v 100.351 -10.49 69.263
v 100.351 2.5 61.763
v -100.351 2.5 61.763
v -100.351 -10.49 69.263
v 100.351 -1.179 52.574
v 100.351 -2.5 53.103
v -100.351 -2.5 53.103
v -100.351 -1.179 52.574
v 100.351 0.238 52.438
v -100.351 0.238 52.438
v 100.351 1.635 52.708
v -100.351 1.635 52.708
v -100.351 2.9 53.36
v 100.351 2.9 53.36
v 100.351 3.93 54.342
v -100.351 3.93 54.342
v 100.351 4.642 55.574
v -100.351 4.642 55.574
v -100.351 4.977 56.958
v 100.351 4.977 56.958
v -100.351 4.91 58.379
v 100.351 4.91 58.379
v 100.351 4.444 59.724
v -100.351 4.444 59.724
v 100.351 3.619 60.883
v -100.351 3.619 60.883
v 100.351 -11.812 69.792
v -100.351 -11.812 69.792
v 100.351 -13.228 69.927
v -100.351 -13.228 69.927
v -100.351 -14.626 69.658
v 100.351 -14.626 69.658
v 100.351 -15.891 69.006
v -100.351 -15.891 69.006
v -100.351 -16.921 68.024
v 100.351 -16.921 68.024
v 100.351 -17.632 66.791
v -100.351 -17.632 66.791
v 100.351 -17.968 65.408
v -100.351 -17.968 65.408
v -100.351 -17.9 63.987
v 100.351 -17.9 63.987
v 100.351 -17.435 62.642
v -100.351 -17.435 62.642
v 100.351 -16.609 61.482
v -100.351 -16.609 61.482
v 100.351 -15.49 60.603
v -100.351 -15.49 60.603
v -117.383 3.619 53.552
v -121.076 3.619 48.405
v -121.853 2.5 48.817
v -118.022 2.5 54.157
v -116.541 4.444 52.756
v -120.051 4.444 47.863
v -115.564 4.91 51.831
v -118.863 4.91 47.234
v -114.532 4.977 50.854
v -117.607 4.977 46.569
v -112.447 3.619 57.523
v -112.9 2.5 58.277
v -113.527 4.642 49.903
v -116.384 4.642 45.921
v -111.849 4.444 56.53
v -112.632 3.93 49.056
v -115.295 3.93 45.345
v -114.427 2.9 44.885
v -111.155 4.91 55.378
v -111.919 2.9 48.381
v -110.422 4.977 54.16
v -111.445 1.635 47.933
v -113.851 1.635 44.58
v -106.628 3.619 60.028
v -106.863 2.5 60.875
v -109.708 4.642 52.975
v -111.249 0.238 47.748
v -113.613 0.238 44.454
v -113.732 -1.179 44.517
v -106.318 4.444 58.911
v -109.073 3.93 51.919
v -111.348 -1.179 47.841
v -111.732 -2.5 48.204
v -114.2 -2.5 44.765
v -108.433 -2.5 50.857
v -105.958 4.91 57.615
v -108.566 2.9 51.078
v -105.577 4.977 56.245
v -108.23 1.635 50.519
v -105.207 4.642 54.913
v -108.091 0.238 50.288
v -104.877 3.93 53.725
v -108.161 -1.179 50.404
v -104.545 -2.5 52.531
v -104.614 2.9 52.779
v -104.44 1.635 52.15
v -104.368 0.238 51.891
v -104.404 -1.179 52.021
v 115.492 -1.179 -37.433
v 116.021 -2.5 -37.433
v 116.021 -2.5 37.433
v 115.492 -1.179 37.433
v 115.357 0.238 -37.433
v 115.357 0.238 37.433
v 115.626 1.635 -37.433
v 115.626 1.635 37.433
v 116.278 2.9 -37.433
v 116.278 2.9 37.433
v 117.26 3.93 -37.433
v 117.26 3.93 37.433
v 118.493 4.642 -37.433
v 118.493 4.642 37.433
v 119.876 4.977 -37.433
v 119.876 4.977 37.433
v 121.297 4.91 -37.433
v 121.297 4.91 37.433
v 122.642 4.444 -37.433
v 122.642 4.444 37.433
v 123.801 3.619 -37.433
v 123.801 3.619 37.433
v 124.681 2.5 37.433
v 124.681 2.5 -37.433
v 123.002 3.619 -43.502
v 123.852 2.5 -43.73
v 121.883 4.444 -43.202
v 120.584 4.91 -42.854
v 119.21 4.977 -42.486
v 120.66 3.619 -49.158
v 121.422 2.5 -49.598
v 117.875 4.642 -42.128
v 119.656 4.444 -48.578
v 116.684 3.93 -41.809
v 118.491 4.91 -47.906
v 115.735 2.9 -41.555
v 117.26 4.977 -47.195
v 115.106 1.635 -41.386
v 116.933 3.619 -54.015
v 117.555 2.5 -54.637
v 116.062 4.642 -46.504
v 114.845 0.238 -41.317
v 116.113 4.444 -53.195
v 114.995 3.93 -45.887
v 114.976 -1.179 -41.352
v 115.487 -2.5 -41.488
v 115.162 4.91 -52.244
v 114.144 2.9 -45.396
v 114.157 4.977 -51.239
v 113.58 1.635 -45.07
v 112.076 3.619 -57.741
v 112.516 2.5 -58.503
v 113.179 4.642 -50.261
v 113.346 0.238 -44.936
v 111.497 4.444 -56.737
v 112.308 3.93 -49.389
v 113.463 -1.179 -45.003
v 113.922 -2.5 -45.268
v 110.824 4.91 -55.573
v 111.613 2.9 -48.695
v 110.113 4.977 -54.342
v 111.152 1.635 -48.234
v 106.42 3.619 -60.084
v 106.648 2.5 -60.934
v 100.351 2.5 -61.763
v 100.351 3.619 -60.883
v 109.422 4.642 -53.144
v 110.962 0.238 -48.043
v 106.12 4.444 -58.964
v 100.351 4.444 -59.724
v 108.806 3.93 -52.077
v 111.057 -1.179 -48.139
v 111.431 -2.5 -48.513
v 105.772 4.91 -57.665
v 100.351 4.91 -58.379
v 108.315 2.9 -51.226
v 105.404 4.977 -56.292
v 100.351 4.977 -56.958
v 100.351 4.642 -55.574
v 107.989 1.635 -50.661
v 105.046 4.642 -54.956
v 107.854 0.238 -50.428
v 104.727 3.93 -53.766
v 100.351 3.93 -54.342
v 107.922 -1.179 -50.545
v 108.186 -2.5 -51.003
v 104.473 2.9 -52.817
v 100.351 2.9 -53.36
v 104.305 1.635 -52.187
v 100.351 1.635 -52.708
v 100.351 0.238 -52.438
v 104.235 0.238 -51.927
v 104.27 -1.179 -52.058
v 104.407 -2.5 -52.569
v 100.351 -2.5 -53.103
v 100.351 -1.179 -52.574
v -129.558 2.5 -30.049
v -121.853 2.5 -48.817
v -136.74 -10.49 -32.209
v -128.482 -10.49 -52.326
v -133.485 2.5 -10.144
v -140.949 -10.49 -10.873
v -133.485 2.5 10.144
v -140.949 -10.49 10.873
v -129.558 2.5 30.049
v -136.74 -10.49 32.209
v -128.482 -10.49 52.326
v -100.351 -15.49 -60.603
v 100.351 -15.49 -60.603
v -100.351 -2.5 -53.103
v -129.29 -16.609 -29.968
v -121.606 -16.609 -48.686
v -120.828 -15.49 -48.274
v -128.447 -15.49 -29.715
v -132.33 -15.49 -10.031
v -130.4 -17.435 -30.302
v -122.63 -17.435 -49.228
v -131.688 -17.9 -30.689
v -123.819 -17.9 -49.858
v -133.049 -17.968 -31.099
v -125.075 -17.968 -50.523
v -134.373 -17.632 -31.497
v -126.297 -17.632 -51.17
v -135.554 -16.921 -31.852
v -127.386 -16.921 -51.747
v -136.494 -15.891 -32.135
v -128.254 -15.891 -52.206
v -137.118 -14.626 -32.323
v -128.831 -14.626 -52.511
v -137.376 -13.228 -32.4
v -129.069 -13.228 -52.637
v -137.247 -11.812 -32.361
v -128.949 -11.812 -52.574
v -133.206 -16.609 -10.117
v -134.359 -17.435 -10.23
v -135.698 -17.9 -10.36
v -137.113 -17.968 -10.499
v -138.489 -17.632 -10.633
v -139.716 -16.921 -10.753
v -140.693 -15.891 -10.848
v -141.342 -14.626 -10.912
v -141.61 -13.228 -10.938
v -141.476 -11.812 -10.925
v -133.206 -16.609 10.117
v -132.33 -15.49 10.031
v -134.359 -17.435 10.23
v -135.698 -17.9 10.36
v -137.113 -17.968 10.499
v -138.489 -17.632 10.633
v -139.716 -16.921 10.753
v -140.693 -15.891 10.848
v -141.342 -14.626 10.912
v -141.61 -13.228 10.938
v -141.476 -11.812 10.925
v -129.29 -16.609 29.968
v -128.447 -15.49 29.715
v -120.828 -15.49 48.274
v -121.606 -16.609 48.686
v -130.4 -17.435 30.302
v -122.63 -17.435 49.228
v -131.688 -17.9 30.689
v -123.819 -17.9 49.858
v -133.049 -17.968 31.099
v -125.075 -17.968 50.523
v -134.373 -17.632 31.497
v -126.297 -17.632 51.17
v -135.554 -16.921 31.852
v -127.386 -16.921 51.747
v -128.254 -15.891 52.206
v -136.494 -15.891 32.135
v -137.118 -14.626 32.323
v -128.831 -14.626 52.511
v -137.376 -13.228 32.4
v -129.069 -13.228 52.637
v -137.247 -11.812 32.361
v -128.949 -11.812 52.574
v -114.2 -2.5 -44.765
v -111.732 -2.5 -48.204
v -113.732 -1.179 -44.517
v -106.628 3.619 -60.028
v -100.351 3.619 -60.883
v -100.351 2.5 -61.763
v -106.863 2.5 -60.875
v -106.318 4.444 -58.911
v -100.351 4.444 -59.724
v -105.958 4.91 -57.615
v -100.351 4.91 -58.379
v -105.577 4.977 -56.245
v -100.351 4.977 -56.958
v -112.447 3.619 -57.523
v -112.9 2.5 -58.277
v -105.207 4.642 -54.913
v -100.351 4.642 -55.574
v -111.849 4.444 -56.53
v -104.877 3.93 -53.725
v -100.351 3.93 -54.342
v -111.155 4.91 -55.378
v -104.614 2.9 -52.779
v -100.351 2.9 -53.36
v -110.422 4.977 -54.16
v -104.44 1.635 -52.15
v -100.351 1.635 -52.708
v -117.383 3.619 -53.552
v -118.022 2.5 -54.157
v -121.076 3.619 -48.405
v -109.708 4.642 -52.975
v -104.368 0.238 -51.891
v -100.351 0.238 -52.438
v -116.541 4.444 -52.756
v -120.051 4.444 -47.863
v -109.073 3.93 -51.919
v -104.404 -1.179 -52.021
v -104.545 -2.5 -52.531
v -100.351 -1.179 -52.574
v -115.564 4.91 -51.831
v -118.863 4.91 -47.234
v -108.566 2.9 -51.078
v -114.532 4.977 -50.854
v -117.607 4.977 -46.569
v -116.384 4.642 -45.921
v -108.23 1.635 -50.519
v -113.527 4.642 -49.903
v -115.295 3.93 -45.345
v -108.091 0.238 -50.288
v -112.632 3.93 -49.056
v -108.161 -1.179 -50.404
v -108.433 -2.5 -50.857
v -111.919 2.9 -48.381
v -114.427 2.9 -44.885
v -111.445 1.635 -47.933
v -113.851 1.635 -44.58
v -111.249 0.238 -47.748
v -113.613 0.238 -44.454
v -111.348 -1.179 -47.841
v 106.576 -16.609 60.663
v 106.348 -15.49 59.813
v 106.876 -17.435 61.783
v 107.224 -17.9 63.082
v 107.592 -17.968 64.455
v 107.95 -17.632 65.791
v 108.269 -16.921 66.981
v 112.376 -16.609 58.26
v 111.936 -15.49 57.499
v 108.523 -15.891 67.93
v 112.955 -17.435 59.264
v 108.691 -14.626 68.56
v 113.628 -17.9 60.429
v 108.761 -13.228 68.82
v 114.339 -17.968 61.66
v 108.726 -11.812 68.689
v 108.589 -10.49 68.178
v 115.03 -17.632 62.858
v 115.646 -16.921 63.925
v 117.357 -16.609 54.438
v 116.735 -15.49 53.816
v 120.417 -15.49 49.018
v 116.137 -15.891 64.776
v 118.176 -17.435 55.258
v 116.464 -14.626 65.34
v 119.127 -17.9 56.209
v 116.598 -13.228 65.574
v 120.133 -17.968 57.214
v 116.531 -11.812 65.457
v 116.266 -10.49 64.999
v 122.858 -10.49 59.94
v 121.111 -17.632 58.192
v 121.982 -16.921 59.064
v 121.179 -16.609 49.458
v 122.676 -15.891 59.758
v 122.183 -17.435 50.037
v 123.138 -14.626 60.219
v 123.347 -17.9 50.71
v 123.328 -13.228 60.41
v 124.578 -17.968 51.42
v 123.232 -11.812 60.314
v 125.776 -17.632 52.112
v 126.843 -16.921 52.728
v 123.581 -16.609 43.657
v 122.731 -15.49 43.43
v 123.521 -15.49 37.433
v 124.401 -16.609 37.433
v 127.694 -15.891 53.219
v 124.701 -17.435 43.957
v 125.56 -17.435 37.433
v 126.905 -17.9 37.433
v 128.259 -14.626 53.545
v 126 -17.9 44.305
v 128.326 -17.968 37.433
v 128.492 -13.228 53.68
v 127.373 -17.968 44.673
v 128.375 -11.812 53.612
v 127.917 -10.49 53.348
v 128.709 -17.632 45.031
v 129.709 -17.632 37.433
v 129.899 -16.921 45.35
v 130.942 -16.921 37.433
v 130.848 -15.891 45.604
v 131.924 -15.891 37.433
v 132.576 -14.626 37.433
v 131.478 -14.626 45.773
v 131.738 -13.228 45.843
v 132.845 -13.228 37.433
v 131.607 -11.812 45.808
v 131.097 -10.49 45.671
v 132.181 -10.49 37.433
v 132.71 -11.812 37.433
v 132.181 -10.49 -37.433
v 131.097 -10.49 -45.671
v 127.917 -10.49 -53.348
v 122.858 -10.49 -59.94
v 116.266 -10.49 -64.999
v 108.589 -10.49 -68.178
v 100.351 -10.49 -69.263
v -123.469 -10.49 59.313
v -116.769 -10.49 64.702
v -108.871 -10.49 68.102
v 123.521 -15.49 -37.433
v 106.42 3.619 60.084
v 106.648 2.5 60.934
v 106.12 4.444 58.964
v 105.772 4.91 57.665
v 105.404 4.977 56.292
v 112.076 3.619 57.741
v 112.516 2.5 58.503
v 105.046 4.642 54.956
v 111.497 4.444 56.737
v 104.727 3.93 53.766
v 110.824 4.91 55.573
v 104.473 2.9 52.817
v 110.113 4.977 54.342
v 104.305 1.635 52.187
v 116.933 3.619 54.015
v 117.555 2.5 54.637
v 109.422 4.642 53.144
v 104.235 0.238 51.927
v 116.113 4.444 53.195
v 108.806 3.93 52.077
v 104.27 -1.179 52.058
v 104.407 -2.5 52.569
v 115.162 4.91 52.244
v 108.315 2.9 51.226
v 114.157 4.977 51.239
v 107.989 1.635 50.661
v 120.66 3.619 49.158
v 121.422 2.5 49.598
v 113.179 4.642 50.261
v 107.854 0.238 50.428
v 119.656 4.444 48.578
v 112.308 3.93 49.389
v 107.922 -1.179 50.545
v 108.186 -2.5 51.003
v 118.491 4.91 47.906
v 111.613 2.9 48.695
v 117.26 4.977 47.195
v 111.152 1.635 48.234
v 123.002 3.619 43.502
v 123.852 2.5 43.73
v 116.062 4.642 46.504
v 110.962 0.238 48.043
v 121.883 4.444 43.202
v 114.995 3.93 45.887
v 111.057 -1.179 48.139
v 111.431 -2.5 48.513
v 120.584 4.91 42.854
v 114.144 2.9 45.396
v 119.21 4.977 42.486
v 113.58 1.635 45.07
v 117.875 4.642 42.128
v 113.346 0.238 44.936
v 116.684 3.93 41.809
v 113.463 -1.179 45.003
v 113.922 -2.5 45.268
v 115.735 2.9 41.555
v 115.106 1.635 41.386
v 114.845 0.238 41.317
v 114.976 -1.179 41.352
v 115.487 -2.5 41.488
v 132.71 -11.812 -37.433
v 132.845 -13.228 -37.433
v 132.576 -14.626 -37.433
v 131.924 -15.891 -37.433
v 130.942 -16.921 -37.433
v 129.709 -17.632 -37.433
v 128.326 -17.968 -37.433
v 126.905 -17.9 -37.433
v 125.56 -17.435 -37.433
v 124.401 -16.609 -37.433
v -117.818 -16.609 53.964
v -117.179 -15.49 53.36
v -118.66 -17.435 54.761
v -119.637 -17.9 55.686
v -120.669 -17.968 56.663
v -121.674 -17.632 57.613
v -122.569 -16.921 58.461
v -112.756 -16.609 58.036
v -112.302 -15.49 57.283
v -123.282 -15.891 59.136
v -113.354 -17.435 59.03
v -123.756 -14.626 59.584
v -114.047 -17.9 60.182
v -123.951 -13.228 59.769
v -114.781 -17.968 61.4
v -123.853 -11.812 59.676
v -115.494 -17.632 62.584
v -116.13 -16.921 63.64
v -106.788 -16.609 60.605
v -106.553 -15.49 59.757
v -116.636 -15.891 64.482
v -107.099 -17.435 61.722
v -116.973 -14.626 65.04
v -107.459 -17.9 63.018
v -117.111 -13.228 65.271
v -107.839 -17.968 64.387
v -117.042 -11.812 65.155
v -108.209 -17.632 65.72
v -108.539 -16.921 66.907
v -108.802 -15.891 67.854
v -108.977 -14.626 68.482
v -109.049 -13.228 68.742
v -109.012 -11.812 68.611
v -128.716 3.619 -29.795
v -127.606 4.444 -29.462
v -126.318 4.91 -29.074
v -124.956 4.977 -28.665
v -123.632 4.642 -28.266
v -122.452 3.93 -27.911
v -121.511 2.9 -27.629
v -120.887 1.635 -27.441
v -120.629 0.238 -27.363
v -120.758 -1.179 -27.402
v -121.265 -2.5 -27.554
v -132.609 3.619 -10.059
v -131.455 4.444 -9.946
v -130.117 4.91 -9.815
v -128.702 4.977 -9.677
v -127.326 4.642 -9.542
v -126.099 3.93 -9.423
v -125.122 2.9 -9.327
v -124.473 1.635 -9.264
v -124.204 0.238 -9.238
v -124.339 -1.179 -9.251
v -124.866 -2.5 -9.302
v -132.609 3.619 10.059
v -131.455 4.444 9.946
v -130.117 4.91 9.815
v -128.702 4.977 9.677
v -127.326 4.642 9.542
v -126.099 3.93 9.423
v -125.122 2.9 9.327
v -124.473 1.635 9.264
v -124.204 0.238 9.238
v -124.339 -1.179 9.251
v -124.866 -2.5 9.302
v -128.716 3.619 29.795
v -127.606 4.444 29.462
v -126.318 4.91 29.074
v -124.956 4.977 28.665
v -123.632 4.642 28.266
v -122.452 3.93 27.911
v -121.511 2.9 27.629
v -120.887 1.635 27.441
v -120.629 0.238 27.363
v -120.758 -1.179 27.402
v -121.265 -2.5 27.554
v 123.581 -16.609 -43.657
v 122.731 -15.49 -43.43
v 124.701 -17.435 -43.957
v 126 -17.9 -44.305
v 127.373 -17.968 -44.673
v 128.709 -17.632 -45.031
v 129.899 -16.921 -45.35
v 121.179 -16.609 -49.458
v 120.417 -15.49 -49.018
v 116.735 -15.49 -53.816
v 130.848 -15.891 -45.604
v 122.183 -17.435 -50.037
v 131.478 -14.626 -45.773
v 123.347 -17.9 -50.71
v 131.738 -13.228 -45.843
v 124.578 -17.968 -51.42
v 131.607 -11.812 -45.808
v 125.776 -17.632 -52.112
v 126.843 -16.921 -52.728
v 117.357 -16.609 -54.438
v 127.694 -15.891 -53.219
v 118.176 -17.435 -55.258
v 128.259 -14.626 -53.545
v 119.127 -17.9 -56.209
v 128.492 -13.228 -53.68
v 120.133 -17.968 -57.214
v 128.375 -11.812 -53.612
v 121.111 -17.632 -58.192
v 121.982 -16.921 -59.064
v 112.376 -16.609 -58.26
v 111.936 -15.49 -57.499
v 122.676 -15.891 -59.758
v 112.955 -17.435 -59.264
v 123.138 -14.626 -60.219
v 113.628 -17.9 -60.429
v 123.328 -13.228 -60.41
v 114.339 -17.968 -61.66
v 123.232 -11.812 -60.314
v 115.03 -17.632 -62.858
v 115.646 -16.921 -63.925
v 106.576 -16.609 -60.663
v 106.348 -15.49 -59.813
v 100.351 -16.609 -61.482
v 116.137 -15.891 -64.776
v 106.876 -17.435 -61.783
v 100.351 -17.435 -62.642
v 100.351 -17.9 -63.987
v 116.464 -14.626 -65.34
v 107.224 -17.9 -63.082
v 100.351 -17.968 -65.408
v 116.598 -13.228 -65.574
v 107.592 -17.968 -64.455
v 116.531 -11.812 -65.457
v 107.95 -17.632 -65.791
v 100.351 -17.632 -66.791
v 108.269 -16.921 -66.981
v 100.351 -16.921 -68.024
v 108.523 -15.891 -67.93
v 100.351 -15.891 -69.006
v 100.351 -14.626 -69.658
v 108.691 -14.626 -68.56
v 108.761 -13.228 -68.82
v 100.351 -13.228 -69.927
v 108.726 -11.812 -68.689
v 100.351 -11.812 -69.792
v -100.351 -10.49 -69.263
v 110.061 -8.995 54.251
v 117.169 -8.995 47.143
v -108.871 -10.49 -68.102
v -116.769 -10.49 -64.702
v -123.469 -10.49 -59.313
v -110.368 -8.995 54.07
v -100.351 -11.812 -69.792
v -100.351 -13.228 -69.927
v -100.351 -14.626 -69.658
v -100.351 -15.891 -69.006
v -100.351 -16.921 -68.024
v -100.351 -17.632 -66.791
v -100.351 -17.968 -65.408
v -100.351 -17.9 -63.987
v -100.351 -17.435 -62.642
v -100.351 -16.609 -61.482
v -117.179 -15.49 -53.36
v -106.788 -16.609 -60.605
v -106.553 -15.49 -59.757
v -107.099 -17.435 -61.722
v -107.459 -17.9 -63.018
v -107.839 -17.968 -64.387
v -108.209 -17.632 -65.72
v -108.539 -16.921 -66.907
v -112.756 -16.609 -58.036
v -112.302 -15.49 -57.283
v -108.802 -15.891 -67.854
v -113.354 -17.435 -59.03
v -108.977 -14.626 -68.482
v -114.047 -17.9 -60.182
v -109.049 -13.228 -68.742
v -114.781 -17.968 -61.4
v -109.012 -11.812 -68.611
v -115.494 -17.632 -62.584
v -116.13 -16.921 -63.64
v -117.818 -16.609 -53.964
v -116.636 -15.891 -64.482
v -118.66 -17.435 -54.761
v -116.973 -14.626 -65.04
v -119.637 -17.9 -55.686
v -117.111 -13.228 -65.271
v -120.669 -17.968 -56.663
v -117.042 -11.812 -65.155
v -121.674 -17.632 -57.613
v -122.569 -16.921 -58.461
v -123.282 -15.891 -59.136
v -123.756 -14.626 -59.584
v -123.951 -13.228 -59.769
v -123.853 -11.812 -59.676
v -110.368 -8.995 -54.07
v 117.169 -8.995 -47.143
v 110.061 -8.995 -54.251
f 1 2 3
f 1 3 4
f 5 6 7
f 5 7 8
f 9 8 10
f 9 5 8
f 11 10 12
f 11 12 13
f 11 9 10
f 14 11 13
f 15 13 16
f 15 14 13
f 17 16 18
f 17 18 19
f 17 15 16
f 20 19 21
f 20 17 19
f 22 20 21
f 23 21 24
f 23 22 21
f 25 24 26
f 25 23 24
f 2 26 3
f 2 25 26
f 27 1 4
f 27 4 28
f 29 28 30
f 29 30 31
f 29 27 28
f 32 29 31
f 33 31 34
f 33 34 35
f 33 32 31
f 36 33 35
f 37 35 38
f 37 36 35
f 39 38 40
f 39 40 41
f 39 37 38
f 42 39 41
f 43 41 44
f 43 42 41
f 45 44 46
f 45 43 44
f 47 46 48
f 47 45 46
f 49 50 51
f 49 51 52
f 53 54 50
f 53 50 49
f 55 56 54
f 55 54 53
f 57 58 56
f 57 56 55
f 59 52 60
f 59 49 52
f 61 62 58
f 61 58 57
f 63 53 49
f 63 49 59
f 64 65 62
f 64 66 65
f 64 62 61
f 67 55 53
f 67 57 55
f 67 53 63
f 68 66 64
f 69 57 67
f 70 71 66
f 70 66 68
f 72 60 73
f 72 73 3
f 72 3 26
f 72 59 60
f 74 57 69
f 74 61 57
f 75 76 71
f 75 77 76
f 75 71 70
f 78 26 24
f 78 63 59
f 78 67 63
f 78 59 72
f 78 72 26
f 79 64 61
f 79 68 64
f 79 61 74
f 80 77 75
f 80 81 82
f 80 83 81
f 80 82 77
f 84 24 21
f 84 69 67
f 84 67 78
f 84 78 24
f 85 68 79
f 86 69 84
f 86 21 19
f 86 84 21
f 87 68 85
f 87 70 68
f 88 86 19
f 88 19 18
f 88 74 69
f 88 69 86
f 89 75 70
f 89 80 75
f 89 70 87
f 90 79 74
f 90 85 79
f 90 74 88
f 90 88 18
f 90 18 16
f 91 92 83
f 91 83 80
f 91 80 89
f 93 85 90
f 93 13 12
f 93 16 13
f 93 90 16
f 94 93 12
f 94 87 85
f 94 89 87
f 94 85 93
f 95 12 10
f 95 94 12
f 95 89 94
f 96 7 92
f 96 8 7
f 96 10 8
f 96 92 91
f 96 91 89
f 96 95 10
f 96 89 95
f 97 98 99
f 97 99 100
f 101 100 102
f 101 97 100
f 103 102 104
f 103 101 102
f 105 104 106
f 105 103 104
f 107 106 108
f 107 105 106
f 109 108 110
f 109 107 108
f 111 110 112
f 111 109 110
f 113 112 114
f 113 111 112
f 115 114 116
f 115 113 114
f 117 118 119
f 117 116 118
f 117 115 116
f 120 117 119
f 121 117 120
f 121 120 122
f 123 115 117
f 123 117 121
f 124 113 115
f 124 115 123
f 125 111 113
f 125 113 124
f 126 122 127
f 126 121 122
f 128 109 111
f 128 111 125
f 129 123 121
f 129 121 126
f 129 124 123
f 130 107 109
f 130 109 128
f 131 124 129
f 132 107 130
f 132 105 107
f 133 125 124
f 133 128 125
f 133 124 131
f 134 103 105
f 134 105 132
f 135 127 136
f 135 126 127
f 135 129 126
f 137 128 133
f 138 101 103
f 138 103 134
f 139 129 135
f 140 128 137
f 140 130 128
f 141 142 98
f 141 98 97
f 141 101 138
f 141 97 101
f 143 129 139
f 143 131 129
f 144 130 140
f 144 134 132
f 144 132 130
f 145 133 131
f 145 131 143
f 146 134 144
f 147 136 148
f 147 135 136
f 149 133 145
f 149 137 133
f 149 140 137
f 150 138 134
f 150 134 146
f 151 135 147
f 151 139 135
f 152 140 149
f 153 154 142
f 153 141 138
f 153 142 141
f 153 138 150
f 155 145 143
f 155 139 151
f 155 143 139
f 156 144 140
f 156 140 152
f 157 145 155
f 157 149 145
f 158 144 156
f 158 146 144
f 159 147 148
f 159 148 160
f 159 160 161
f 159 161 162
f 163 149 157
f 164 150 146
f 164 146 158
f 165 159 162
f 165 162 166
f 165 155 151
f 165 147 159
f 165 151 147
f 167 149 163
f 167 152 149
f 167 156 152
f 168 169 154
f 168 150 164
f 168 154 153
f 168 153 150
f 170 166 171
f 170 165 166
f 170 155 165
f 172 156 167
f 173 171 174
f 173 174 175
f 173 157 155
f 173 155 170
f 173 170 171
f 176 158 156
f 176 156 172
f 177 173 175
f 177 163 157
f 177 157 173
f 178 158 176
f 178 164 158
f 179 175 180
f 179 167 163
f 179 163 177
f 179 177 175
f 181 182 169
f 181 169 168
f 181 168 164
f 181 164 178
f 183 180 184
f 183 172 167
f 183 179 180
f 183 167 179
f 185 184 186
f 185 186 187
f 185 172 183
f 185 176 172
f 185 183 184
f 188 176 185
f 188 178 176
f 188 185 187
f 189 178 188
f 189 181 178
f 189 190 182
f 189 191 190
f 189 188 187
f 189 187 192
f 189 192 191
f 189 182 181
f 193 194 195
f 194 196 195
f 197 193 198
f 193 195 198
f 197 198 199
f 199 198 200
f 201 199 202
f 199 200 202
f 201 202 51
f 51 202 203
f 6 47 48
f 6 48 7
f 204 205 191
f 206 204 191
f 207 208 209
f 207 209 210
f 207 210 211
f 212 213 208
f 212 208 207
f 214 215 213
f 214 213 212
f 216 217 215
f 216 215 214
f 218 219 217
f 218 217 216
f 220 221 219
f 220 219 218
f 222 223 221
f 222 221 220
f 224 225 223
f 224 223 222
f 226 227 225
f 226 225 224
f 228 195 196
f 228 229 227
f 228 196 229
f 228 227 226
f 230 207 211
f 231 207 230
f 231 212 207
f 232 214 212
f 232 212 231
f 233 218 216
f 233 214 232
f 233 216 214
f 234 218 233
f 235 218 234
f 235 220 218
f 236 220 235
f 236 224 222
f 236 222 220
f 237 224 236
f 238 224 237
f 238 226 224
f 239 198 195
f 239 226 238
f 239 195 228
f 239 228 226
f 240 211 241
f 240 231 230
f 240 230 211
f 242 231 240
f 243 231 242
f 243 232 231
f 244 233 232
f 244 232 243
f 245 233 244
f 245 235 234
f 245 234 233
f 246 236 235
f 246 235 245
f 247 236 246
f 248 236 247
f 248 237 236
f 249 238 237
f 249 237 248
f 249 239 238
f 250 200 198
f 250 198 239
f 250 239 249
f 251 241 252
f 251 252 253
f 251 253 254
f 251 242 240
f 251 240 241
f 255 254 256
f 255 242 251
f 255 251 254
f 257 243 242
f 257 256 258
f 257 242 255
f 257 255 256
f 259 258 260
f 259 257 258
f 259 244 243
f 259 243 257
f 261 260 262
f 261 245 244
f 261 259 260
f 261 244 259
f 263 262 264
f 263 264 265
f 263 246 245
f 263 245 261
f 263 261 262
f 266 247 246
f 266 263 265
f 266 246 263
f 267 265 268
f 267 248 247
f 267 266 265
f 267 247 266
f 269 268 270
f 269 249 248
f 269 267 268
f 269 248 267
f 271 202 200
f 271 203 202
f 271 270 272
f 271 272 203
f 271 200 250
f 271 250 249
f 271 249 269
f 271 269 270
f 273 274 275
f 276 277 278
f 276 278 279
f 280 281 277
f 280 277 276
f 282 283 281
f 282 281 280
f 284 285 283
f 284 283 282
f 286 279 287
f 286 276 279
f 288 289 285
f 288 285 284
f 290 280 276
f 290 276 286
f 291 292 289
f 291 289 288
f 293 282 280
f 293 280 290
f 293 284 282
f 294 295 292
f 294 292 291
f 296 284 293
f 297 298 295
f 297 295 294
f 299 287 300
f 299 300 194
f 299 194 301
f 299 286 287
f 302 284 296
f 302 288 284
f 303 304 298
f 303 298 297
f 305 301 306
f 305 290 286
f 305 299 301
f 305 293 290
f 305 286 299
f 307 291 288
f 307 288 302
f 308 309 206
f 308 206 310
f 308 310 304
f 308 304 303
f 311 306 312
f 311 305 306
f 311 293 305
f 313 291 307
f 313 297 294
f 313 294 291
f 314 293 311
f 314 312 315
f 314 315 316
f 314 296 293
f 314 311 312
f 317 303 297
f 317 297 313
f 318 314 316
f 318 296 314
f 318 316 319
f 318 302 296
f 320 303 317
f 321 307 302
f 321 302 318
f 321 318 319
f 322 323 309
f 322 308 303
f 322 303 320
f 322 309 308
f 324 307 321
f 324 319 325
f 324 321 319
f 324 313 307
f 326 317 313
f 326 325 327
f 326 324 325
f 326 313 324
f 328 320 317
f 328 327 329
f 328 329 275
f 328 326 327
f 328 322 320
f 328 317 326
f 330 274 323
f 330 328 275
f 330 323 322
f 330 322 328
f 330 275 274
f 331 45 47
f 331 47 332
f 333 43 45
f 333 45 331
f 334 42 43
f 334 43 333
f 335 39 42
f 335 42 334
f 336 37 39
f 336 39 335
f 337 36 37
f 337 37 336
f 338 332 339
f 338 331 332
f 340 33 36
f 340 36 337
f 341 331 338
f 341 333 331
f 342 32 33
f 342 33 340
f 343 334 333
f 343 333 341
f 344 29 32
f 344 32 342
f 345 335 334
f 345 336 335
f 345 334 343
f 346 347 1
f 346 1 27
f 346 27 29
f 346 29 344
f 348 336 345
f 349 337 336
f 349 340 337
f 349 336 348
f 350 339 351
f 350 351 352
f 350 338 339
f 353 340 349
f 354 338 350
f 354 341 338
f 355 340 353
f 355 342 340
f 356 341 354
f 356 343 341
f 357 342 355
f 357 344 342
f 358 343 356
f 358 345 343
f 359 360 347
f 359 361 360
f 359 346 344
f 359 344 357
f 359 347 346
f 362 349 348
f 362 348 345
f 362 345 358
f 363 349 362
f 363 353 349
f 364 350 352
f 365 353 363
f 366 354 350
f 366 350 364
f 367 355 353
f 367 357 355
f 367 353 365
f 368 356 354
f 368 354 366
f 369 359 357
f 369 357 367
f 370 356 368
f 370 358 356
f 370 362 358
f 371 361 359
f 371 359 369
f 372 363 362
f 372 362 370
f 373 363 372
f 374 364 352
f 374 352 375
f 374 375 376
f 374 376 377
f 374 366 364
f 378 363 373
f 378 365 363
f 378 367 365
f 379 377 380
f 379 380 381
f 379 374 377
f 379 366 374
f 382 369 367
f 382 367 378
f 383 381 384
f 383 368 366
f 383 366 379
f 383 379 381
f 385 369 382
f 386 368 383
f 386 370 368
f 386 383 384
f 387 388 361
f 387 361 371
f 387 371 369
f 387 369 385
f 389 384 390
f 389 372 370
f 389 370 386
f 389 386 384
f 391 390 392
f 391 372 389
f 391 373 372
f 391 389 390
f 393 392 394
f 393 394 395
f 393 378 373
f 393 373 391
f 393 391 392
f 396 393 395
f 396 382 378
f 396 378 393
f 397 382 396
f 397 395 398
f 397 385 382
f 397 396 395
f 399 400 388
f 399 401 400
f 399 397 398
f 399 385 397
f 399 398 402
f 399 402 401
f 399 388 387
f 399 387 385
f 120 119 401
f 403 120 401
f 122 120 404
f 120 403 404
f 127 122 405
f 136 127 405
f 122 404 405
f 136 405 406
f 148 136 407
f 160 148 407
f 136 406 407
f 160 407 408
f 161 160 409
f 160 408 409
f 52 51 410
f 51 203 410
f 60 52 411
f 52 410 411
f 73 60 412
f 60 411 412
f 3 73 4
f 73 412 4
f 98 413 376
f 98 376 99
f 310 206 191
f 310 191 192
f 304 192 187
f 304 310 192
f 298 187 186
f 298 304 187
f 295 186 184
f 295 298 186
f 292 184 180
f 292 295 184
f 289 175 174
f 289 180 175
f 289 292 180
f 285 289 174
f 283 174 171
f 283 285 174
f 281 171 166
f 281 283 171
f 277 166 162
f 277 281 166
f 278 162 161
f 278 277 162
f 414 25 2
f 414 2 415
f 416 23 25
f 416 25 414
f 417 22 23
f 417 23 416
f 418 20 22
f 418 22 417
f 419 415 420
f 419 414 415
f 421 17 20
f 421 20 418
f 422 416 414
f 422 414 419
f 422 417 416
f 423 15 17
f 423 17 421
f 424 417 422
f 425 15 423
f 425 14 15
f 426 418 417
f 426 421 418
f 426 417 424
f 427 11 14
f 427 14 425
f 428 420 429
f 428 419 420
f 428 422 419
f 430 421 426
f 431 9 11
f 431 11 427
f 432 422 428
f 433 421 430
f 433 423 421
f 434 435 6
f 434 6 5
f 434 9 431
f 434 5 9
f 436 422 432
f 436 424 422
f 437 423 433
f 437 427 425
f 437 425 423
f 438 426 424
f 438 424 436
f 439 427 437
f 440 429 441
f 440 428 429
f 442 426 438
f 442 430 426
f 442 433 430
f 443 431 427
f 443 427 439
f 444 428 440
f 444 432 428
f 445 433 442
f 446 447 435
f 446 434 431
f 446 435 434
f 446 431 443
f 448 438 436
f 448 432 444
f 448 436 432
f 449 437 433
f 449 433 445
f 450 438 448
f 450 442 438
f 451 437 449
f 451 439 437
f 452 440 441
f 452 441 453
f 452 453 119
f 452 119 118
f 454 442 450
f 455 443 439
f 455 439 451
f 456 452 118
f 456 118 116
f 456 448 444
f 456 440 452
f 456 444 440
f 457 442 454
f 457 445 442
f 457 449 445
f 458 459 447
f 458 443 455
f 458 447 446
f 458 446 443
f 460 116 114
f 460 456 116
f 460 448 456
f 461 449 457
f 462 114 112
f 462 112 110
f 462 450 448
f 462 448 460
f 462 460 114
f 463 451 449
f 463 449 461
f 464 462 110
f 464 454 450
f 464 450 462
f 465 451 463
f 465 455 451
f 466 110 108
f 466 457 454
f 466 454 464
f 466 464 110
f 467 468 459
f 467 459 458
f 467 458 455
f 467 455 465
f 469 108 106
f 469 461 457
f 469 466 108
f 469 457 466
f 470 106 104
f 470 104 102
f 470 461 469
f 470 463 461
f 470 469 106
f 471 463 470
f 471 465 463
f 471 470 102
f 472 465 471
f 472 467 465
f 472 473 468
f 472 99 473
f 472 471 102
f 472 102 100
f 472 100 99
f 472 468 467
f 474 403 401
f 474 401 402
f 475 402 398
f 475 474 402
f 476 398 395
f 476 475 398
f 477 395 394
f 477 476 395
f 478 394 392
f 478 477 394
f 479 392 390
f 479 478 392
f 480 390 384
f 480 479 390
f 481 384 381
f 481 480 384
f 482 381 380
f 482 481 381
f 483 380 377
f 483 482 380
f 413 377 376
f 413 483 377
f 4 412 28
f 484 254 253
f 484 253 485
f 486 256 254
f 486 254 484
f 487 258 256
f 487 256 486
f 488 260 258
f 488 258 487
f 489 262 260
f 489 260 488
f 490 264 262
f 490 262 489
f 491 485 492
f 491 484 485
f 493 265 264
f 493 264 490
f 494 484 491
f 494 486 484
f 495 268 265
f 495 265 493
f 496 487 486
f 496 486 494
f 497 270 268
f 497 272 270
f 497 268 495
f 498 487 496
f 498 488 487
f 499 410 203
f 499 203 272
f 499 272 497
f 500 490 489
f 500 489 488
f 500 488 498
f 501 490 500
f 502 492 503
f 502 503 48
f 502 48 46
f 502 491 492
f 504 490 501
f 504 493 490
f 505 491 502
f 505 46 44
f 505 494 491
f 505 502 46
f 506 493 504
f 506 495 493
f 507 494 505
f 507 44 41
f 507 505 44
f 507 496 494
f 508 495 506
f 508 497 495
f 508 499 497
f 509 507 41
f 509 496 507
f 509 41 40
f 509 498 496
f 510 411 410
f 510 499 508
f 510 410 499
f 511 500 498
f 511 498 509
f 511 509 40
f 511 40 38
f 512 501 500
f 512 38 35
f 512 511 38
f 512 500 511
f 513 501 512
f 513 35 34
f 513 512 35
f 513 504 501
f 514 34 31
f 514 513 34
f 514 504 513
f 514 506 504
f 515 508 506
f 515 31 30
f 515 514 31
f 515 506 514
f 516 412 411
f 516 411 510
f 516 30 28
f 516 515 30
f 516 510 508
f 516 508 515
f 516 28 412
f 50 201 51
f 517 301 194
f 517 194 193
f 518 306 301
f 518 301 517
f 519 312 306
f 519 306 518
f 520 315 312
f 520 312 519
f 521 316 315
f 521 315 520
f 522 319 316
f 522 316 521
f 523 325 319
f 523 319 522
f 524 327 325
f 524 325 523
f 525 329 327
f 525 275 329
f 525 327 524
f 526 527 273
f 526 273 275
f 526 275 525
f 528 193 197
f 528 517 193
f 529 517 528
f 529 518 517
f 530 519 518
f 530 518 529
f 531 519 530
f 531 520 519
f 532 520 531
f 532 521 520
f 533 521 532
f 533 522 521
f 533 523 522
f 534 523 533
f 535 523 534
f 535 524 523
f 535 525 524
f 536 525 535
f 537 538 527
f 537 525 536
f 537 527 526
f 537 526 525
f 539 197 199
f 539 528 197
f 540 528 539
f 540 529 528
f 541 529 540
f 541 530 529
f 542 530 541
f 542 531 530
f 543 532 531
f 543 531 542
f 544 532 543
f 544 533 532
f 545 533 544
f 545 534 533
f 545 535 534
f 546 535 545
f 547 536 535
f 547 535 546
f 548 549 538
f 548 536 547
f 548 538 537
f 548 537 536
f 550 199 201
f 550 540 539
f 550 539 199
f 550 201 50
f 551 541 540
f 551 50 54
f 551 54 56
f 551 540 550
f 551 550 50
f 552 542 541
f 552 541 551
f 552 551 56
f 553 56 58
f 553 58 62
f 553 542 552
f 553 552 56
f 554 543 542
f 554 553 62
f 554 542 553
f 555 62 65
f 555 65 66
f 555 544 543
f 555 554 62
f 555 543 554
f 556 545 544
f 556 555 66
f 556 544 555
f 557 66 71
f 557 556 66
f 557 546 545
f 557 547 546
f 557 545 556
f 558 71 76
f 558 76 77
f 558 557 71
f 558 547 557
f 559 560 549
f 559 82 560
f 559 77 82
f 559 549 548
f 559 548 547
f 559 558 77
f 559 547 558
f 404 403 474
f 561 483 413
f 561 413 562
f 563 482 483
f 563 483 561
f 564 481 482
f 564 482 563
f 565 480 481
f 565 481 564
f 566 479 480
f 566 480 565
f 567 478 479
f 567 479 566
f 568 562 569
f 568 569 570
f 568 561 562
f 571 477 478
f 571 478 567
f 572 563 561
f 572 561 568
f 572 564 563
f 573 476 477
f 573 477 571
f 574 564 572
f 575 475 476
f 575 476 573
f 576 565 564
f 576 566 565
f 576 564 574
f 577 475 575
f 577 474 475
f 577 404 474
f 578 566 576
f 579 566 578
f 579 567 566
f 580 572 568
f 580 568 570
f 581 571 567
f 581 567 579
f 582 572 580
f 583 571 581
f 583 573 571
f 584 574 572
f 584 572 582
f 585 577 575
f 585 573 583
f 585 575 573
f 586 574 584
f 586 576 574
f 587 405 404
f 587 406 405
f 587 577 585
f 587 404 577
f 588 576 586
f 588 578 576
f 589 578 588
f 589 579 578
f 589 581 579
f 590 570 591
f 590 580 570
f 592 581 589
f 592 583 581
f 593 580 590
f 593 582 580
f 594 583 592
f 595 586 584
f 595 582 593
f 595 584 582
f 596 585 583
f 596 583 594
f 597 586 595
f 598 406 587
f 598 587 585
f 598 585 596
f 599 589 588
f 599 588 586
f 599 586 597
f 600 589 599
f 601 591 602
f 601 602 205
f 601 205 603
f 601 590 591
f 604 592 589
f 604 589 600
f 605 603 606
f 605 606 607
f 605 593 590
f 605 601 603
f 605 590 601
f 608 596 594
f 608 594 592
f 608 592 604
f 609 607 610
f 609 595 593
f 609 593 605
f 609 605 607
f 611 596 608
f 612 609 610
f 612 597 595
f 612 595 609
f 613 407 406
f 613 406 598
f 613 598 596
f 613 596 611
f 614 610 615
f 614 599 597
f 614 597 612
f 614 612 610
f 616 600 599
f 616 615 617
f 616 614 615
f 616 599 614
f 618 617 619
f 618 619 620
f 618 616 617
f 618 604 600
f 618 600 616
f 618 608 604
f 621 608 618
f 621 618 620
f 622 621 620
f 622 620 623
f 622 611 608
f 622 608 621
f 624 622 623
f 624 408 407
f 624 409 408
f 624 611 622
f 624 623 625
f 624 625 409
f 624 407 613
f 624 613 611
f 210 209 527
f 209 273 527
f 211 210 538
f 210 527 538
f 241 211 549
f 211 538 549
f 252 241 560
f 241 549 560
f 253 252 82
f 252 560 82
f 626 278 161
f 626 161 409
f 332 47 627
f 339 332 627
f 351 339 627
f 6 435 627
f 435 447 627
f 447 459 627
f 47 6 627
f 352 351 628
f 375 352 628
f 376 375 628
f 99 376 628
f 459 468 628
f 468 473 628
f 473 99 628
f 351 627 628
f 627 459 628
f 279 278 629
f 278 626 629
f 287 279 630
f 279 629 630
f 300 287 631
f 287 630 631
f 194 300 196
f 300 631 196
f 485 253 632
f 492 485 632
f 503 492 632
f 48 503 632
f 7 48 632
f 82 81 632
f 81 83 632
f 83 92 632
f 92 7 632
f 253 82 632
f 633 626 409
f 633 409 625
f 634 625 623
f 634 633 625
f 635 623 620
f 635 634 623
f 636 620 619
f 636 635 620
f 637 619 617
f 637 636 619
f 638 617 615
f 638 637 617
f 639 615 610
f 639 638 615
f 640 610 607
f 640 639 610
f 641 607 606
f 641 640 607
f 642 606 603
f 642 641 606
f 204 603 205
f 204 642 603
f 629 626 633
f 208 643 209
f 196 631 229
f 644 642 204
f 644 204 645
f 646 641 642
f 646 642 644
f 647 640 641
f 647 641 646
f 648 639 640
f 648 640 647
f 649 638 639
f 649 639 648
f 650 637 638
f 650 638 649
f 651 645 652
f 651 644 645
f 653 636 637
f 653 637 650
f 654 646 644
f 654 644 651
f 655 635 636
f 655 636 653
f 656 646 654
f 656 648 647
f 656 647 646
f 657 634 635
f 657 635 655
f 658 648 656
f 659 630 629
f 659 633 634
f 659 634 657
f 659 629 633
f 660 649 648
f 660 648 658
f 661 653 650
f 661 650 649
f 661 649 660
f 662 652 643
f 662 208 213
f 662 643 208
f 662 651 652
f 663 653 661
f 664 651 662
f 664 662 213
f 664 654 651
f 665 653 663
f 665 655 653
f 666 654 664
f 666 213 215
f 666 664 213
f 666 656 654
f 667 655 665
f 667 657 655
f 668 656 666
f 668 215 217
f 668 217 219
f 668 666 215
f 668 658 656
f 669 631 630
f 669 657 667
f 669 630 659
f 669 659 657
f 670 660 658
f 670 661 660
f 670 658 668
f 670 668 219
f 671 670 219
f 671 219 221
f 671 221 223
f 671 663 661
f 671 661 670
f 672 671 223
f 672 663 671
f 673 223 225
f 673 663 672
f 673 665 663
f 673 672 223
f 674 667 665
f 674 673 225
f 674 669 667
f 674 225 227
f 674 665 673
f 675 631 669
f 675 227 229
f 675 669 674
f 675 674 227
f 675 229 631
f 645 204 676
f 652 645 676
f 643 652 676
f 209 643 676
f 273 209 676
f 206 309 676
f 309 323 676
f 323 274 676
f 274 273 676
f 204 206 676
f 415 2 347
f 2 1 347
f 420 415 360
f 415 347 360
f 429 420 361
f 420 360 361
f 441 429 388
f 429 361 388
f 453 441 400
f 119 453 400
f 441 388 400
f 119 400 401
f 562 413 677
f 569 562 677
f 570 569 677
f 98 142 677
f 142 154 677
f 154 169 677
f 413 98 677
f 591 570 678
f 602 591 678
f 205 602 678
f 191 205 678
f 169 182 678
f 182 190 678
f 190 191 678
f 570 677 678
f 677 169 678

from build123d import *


with BuildPart() as part:
    # Austragung2: sweep along a path in Skizze1
    with BuildLine(Plane(origin=(0, 0, 0), x_dir=(1, 0, 0), z_dir=(0, 1, 0))) as austragung2_path:
        Line((-100.35104183, -57.432811357), (100.35104183, -57.432811357))
        ThreePointArc((100.35104183, -57.432811357), (114.493177454, -51.574946981), (120.35104183, -37.432811357))
        Line((120.35104183, -37.432811357), (120.35104183, 37.432811357))
        ThreePointArc((120.35104183, 37.432811357), (114.493177454, 51.574946981), (100.35104183, 57.432811357))
        Line((100.35104183, 57.432811357), (-100.35104183, 57.432811357))
        ThreePointArc((-100.35104183, 57.432811357), (-110.666950496, 54.567046922), (-118.026562745, 46.791014197))
        ThreePointArc((-118.026562745, 46.791014197), (-129.64895817, 0), (-118.026562745, -46.791014197))
        ThreePointArc((-118.026562745, -46.791014197), (-110.666950496, -54.567046922), (-100.35104183, -57.432811357))
    # Skizze2 → Austragung2 (sweep)
    with BuildSketch(Plane.XY):
        with BuildLine():
            Line((-125.318831151, -2.5), (-132.818831151, -15.490381057))
            ThreePointArc((-132.818831151, -15.490381057), (-139.64895817, -17.320508076), (-141.479085189, -10.490381057))
            Line((-141.479085189, -10.490381057), (-133.979085189, 2.5))
            ThreePointArc((-133.979085189, 2.5), (-127.14895817, 4.330127019), (-125.318831151, -2.5))
        make_face()
    sweep(path=austragung2_path.line)


solid = part.part
